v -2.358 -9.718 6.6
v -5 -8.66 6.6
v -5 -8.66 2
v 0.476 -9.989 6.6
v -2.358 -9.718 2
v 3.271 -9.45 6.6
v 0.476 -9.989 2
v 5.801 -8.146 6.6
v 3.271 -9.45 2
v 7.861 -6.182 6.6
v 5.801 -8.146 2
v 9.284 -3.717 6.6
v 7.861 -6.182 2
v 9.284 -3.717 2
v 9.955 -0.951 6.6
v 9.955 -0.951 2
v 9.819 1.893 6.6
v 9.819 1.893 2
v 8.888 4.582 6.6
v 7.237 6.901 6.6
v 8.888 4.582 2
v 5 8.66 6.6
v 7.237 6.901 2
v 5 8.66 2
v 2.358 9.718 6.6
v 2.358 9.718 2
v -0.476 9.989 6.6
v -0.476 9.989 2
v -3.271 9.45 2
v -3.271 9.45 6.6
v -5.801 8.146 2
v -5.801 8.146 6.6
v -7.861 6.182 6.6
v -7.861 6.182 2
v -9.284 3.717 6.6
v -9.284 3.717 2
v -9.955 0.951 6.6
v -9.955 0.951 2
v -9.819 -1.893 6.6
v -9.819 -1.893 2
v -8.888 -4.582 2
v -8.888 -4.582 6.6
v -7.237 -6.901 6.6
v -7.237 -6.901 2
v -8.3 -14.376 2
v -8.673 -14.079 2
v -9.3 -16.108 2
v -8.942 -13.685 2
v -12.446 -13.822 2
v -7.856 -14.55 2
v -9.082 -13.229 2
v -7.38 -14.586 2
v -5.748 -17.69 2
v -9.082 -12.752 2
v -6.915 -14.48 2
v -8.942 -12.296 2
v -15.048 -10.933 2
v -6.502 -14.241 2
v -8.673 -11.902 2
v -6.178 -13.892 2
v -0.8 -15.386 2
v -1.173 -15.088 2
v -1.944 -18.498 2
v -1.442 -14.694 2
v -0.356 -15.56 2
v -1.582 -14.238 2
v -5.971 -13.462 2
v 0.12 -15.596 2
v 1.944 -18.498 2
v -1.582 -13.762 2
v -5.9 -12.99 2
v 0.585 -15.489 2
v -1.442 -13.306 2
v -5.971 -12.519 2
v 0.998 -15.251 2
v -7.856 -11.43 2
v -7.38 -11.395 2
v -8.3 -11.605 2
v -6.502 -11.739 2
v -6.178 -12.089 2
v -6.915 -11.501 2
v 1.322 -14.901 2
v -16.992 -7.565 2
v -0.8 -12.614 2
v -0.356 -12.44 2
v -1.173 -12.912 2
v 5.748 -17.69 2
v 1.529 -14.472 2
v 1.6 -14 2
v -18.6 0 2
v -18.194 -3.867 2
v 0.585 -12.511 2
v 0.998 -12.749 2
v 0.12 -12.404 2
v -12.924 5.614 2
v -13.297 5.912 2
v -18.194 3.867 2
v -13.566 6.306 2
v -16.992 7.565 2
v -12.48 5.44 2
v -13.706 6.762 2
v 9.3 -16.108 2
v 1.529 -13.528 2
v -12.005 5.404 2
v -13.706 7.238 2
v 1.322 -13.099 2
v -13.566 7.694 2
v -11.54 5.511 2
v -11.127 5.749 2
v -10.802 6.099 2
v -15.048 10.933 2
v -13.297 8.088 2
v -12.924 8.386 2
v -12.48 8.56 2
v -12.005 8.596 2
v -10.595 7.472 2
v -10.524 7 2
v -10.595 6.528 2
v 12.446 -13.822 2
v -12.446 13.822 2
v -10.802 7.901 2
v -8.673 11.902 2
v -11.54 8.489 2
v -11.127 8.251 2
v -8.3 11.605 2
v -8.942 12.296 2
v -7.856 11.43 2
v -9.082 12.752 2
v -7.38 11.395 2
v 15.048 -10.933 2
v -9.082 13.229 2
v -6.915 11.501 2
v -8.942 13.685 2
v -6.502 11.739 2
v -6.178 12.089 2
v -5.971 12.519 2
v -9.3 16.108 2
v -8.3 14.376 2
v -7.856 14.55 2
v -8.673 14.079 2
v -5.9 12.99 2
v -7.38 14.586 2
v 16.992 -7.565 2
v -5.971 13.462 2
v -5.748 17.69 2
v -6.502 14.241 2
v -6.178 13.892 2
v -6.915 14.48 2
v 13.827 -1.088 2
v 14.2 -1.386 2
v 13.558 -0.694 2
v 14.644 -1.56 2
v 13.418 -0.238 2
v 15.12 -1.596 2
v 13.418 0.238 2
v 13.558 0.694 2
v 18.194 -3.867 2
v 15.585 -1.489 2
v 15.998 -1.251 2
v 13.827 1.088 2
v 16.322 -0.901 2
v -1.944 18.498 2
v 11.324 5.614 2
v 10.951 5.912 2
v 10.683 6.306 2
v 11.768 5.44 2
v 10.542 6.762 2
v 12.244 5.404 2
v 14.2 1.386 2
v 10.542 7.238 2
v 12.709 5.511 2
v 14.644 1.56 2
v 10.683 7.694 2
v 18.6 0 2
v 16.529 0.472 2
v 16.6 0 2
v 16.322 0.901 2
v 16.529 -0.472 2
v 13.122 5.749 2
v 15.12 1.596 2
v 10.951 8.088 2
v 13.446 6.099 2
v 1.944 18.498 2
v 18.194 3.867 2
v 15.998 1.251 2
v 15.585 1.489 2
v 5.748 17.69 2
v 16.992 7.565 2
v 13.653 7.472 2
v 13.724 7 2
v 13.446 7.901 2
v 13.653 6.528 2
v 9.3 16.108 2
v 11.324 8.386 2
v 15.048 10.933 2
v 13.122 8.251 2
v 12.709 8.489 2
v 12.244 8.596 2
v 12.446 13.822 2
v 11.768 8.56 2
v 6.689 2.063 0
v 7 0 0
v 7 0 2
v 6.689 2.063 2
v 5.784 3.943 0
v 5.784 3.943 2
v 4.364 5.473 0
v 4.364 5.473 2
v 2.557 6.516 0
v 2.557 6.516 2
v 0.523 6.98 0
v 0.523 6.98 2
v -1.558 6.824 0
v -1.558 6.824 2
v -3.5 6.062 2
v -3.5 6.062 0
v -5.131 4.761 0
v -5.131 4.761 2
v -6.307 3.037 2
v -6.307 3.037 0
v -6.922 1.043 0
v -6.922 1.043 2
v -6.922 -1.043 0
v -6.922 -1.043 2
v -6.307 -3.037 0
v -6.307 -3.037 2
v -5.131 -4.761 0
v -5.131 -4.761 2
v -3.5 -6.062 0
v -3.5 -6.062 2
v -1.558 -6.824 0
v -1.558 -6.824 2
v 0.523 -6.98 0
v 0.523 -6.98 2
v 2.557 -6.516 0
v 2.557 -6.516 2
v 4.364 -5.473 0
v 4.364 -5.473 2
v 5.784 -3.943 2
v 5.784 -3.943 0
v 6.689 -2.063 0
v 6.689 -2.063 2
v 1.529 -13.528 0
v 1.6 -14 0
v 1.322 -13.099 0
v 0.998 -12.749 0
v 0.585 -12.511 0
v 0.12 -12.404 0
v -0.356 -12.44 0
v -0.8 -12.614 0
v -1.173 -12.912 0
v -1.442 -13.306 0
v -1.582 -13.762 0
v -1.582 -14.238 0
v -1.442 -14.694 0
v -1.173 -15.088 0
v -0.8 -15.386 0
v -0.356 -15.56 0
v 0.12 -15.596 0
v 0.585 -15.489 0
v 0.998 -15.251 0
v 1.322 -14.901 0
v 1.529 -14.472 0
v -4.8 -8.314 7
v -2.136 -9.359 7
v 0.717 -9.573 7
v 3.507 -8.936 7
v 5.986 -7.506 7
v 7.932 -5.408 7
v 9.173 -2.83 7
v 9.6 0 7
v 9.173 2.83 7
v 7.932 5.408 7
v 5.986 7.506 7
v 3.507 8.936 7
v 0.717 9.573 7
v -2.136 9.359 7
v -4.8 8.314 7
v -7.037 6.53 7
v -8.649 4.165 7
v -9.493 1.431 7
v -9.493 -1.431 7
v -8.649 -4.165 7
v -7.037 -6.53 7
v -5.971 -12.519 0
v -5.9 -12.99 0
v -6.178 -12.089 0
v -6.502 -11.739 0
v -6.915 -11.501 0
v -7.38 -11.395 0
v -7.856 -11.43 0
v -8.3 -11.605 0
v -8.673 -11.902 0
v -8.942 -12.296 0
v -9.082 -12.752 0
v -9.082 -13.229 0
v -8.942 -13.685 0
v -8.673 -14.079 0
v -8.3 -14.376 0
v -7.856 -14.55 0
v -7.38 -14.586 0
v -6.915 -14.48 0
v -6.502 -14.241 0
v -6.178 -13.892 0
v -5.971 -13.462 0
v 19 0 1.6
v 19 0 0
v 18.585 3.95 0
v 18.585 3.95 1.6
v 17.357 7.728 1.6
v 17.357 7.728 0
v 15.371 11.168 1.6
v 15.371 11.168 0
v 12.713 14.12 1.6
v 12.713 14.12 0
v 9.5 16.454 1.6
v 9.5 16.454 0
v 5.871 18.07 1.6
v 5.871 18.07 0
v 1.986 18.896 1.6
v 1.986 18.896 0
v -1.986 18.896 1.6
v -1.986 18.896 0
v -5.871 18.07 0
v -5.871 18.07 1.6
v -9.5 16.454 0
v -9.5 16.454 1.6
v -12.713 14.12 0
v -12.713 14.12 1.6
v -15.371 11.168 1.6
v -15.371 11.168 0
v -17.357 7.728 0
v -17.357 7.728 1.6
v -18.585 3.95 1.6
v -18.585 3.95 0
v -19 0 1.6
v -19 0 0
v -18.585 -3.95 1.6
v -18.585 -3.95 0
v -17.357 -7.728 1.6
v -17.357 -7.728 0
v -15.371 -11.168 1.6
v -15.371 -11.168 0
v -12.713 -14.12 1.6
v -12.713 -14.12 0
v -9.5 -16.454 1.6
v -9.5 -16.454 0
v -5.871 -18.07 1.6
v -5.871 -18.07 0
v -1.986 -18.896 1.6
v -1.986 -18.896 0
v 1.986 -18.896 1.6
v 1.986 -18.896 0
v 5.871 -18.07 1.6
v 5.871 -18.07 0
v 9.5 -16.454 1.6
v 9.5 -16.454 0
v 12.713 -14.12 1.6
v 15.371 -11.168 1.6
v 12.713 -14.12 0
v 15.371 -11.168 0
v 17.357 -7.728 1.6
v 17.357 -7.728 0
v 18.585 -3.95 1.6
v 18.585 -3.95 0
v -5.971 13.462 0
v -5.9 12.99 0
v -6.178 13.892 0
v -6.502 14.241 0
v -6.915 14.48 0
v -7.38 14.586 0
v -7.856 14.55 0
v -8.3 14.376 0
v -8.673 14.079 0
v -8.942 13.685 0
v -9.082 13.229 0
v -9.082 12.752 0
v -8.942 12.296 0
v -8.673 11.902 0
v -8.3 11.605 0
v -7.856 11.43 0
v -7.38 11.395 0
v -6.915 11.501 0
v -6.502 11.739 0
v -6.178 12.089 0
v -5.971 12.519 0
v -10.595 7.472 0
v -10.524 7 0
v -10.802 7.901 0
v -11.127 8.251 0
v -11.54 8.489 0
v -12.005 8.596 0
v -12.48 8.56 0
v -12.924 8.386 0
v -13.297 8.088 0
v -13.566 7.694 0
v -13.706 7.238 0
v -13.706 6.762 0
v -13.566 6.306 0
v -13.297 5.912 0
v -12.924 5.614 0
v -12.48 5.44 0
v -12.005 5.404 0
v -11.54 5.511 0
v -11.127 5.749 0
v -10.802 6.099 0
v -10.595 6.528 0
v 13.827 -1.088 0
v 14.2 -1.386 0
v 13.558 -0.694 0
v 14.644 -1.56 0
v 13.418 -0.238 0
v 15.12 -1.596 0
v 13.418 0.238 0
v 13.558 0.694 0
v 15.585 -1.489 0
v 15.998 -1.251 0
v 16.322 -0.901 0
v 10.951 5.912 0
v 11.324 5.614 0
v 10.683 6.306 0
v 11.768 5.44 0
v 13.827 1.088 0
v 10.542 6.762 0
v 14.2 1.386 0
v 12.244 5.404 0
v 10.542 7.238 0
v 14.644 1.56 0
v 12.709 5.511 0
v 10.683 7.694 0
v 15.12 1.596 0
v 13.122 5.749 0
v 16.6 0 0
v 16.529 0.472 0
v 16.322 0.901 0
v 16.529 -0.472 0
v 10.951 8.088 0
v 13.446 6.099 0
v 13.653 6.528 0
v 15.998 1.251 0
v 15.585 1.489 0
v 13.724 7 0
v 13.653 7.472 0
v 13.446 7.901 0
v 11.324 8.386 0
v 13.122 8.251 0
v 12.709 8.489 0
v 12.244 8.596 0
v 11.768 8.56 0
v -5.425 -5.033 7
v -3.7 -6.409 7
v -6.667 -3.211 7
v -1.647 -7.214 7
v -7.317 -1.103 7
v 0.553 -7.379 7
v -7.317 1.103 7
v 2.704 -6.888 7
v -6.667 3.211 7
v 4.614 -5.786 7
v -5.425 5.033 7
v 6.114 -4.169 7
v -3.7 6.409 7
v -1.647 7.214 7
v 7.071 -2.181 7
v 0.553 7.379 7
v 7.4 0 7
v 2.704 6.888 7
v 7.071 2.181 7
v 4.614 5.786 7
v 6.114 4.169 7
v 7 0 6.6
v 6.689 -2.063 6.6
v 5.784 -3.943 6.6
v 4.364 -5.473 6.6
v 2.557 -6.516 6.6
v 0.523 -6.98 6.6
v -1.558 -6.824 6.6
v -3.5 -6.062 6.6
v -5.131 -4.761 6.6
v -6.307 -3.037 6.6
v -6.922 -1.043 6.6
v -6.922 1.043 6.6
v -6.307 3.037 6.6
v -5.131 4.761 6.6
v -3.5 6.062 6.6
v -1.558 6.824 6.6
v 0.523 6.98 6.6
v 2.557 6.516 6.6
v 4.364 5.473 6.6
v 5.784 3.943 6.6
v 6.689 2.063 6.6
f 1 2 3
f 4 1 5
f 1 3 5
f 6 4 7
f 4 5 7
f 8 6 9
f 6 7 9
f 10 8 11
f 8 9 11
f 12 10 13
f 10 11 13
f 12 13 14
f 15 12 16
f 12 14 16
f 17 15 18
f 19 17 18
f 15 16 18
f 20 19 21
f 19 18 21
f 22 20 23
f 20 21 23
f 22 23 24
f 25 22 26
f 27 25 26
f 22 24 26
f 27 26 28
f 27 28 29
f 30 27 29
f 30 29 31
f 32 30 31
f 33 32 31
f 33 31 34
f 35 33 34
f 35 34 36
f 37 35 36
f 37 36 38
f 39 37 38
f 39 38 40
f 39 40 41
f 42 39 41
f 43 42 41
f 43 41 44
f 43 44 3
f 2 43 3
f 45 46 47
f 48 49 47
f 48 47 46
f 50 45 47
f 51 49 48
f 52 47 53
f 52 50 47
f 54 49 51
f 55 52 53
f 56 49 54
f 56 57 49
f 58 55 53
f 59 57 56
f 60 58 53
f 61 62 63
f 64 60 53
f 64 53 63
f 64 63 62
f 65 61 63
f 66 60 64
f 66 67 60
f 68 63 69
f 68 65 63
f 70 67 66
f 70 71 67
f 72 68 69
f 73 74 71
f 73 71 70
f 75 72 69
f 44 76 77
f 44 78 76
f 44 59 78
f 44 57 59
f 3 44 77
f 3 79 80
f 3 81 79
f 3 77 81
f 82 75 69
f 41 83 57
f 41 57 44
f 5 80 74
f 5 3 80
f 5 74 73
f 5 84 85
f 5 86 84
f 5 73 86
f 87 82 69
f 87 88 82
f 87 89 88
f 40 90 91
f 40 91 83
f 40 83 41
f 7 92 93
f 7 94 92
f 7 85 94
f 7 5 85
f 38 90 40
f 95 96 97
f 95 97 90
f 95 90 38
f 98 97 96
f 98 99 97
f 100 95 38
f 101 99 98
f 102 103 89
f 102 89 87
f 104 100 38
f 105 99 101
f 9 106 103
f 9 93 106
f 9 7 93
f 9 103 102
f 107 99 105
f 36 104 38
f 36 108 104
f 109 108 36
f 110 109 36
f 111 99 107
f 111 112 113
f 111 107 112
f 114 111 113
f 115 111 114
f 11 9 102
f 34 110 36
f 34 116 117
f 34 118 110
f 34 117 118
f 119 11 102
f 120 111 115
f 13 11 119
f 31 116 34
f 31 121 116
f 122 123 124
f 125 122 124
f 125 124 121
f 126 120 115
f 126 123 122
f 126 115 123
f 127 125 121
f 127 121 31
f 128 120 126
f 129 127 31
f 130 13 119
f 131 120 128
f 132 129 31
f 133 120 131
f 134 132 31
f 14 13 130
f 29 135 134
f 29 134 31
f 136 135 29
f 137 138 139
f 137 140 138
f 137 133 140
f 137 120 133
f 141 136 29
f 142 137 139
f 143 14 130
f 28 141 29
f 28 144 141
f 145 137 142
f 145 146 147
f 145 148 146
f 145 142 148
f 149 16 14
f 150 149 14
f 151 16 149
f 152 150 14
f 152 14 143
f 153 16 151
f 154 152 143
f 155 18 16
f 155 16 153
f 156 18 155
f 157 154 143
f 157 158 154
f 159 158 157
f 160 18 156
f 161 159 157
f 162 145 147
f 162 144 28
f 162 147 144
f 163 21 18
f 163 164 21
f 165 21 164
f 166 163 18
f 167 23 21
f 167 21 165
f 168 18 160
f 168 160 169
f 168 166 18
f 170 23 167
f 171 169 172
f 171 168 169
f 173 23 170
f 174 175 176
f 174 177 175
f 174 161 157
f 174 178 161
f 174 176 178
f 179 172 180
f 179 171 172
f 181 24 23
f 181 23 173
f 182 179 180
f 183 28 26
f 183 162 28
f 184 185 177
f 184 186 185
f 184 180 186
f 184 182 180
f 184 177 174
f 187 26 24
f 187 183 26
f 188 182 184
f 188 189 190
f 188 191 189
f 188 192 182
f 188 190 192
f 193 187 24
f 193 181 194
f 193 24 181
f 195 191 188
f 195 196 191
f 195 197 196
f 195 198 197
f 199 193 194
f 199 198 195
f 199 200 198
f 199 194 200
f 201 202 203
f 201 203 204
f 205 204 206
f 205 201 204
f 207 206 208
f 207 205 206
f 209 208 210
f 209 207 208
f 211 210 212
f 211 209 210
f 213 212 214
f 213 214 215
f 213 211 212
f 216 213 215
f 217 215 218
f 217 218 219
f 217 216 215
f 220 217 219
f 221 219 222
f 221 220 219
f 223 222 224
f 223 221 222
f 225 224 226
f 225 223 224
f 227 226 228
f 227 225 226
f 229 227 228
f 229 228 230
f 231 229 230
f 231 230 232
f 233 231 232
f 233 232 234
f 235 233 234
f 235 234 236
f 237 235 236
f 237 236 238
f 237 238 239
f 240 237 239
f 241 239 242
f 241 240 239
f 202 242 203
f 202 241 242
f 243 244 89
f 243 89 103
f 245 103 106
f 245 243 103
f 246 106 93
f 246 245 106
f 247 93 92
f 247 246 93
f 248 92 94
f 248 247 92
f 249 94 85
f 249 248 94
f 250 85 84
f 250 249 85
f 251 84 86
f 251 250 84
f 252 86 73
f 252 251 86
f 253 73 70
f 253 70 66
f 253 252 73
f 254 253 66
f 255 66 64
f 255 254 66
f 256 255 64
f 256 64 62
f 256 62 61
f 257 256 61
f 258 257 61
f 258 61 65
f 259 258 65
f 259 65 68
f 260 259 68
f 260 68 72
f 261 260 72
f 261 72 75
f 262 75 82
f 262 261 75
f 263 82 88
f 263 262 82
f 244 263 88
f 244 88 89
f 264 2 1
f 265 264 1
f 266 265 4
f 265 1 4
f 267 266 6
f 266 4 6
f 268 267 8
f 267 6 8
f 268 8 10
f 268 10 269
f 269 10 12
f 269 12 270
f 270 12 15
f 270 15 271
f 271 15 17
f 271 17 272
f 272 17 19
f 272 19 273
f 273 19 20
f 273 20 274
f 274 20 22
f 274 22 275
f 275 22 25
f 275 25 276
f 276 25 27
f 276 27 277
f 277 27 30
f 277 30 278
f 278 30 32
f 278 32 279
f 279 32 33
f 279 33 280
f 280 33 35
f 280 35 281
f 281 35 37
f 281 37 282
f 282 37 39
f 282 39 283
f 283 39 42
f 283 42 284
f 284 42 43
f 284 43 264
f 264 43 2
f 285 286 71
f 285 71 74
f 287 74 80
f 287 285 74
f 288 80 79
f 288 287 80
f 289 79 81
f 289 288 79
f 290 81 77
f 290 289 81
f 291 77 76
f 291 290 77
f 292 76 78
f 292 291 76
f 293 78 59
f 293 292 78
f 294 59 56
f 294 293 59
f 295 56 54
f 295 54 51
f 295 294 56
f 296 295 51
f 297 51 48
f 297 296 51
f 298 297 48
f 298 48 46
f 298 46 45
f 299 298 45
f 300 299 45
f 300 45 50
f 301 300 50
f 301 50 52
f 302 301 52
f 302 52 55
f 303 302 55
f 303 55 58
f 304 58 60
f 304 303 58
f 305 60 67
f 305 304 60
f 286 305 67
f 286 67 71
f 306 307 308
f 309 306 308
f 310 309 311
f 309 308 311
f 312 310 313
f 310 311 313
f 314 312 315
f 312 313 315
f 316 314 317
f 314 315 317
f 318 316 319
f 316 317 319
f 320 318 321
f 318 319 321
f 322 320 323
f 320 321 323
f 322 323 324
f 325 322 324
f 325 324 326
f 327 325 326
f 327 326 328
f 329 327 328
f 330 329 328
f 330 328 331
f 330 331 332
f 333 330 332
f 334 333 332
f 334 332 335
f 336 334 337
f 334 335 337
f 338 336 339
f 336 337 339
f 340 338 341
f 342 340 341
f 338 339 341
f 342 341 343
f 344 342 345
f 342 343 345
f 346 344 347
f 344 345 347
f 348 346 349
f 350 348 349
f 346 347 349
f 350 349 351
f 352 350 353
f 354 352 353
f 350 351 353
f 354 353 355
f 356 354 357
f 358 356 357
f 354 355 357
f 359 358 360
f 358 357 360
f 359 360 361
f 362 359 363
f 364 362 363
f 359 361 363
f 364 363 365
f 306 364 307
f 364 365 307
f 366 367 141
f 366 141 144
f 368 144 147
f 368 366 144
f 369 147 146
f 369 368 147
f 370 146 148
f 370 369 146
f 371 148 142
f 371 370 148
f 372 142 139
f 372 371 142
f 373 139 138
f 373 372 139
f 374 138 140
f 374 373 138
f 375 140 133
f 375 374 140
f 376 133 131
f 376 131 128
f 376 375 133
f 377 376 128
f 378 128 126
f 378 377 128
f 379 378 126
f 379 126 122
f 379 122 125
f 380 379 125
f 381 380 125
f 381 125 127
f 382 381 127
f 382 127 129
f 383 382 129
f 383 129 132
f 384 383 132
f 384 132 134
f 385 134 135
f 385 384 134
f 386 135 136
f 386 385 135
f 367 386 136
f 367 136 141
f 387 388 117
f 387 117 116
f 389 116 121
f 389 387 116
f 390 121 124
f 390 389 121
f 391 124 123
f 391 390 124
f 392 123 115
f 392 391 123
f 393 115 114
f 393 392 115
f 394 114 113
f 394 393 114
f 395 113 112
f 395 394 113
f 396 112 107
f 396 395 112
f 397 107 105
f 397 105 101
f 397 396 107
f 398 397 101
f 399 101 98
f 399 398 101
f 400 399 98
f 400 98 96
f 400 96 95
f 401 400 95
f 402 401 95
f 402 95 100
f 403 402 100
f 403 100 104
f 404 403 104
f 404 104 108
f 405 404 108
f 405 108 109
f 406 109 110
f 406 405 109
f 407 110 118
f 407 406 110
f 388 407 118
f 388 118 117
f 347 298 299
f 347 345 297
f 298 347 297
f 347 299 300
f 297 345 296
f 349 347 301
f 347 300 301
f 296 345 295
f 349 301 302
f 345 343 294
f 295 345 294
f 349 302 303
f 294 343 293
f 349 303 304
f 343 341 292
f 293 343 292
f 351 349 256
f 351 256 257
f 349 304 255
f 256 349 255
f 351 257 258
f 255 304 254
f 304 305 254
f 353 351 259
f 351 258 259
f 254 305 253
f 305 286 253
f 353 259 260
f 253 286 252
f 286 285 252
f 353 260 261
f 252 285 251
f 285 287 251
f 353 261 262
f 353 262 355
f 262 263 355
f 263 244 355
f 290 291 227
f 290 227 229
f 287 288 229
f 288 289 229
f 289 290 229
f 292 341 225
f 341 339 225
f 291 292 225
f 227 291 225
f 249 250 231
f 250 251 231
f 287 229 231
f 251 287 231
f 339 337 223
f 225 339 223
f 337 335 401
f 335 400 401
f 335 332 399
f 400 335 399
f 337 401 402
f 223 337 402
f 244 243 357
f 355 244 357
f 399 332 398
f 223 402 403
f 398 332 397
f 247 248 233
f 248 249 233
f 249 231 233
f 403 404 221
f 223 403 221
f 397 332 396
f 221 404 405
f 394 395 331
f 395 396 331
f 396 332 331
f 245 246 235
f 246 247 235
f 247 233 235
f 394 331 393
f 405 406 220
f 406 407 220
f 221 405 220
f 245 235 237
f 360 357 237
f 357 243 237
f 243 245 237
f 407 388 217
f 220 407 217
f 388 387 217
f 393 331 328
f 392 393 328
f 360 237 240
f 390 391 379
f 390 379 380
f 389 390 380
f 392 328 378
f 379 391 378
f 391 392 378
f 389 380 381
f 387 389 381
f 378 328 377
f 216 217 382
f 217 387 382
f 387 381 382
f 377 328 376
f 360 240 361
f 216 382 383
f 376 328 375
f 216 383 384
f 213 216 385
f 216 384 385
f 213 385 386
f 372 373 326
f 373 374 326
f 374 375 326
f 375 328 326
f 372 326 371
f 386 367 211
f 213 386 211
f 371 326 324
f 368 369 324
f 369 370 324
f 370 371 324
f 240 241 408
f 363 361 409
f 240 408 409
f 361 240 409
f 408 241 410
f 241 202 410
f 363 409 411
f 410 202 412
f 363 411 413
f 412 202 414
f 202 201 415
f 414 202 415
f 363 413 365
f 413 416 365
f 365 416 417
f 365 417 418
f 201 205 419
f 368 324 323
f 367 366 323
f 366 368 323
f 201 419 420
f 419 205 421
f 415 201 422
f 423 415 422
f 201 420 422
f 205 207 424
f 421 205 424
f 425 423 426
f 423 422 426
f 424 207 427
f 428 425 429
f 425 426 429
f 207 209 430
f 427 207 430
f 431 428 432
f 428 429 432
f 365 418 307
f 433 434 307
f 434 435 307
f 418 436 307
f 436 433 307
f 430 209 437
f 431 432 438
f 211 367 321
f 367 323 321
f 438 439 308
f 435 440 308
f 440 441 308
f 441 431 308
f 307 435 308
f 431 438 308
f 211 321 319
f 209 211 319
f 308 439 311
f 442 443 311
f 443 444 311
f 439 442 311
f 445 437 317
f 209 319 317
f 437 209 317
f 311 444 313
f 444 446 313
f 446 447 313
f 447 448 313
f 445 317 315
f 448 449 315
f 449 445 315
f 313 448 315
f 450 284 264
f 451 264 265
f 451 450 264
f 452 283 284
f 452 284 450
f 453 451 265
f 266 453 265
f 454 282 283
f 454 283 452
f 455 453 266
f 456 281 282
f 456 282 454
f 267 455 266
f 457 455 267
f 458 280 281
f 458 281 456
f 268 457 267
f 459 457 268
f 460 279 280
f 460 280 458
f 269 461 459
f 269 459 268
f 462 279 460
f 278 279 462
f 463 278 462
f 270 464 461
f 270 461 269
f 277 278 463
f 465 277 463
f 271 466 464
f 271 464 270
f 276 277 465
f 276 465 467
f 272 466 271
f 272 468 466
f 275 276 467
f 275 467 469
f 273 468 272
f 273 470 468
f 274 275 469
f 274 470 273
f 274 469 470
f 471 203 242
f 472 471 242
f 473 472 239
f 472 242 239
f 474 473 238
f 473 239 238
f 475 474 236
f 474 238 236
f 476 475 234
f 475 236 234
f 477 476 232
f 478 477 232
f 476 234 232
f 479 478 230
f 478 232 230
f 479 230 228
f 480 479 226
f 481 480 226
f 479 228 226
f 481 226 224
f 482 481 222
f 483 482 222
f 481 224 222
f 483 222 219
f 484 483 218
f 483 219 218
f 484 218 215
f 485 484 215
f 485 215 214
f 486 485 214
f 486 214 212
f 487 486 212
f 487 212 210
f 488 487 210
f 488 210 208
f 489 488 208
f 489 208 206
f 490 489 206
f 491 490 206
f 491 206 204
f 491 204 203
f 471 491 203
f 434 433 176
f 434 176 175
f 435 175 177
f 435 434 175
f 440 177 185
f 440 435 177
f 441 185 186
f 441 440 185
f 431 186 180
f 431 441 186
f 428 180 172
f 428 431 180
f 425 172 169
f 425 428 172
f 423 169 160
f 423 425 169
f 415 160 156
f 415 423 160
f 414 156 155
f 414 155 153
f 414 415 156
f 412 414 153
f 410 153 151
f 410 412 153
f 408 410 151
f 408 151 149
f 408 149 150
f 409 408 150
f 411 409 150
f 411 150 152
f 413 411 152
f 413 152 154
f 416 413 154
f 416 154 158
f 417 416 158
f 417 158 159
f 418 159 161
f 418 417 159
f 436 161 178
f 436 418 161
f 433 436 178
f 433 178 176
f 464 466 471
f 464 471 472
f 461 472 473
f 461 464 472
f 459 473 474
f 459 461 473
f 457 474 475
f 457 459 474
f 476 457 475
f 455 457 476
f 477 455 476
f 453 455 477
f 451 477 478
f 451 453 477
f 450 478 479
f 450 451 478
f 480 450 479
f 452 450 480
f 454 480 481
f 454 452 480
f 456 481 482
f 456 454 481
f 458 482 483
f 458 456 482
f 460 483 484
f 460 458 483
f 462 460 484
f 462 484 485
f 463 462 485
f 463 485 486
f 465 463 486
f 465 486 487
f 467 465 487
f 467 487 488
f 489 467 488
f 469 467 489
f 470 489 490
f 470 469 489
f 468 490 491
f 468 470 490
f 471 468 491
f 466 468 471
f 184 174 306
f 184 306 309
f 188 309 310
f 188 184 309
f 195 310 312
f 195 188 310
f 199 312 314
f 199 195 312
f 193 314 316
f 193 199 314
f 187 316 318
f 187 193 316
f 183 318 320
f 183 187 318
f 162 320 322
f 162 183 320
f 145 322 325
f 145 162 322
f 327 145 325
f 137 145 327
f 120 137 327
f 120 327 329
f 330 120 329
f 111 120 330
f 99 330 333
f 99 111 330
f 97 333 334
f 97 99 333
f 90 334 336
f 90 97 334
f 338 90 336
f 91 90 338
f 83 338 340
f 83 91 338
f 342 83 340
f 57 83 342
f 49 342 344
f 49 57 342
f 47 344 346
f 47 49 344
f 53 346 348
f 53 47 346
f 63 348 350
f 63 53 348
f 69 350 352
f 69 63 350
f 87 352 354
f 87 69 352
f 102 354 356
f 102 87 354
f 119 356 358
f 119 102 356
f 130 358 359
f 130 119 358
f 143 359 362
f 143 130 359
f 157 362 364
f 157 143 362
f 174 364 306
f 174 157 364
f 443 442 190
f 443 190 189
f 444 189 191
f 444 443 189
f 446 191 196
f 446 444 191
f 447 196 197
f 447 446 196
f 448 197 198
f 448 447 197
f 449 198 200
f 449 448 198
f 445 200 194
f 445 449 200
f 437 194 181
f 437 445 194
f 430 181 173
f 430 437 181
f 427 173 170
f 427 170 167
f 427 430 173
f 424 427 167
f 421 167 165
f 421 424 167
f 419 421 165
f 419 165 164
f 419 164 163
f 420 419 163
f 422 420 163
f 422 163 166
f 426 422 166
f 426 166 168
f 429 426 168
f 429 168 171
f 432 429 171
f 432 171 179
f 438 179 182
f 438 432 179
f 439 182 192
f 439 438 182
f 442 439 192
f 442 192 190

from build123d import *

# Parameters (mm, degrees)
SKETCH_1_R      = 19
SKETCH_1_R_2    = 7
SKETCH_1_R_3    = 1.6
EXTRUDE_1_DEPTH = 2
SKETCH_1_3_R    = 10
SKETCH_1_3_R_2  = 7
EXTRUDE_2_DEPTH = 7
CHAMFER_1_SIZE  = 0.4


with BuildPart() as part:
    # 草图1 → 凸台-拉伸1 (new body)
    with BuildSketch(Plane.XY):
        Circle(SKETCH_1_R)
        Circle(SKETCH_1_R_2, mode=Mode.SUBTRACT)
        with Locations((-7.5, -12.990381057)):
            Circle(SKETCH_1_R_3, mode=Mode.SUBTRACT)
        with Locations((0, -14)):
            Circle(SKETCH_1_R_3, mode=Mode.SUBTRACT)
        with Locations((15, 0)):
            Circle(SKETCH_1_R_3, mode=Mode.SUBTRACT)
        with Locations((-12.124355653, 7)):
            Circle(SKETCH_1_R_3, mode=Mode.SUBTRACT)
        with Locations((-7.5, 12.990381057)):
            Circle(SKETCH_1_R_3, mode=Mode.SUBTRACT)
        with Locations((12.124355653, 7)):
            Circle(SKETCH_1_R_3, mode=Mode.SUBTRACT)
    extrude(amount=EXTRUDE_1_DEPTH)

    # 草图1<3> → 凸台-拉伸2 (add)
    with BuildSketch(Plane.XY):
        Circle(SKETCH_1_3_R)
        Circle(SKETCH_1_3_R_2, mode=Mode.SUBTRACT)
    extrude(amount=EXTRUDE_2_DEPTH)

    # 倒角1
    chamfer_1_edges = [part.edges().sort_by_distance(p)[0] for p in [
        (-19, 0, 2),
        (-7, 0, 7),
        (-10, 0, 7),
    ]]
    chamfer(chamfer_1_edges, length=CHAMFER_1_SIZE)


solid = part.part
